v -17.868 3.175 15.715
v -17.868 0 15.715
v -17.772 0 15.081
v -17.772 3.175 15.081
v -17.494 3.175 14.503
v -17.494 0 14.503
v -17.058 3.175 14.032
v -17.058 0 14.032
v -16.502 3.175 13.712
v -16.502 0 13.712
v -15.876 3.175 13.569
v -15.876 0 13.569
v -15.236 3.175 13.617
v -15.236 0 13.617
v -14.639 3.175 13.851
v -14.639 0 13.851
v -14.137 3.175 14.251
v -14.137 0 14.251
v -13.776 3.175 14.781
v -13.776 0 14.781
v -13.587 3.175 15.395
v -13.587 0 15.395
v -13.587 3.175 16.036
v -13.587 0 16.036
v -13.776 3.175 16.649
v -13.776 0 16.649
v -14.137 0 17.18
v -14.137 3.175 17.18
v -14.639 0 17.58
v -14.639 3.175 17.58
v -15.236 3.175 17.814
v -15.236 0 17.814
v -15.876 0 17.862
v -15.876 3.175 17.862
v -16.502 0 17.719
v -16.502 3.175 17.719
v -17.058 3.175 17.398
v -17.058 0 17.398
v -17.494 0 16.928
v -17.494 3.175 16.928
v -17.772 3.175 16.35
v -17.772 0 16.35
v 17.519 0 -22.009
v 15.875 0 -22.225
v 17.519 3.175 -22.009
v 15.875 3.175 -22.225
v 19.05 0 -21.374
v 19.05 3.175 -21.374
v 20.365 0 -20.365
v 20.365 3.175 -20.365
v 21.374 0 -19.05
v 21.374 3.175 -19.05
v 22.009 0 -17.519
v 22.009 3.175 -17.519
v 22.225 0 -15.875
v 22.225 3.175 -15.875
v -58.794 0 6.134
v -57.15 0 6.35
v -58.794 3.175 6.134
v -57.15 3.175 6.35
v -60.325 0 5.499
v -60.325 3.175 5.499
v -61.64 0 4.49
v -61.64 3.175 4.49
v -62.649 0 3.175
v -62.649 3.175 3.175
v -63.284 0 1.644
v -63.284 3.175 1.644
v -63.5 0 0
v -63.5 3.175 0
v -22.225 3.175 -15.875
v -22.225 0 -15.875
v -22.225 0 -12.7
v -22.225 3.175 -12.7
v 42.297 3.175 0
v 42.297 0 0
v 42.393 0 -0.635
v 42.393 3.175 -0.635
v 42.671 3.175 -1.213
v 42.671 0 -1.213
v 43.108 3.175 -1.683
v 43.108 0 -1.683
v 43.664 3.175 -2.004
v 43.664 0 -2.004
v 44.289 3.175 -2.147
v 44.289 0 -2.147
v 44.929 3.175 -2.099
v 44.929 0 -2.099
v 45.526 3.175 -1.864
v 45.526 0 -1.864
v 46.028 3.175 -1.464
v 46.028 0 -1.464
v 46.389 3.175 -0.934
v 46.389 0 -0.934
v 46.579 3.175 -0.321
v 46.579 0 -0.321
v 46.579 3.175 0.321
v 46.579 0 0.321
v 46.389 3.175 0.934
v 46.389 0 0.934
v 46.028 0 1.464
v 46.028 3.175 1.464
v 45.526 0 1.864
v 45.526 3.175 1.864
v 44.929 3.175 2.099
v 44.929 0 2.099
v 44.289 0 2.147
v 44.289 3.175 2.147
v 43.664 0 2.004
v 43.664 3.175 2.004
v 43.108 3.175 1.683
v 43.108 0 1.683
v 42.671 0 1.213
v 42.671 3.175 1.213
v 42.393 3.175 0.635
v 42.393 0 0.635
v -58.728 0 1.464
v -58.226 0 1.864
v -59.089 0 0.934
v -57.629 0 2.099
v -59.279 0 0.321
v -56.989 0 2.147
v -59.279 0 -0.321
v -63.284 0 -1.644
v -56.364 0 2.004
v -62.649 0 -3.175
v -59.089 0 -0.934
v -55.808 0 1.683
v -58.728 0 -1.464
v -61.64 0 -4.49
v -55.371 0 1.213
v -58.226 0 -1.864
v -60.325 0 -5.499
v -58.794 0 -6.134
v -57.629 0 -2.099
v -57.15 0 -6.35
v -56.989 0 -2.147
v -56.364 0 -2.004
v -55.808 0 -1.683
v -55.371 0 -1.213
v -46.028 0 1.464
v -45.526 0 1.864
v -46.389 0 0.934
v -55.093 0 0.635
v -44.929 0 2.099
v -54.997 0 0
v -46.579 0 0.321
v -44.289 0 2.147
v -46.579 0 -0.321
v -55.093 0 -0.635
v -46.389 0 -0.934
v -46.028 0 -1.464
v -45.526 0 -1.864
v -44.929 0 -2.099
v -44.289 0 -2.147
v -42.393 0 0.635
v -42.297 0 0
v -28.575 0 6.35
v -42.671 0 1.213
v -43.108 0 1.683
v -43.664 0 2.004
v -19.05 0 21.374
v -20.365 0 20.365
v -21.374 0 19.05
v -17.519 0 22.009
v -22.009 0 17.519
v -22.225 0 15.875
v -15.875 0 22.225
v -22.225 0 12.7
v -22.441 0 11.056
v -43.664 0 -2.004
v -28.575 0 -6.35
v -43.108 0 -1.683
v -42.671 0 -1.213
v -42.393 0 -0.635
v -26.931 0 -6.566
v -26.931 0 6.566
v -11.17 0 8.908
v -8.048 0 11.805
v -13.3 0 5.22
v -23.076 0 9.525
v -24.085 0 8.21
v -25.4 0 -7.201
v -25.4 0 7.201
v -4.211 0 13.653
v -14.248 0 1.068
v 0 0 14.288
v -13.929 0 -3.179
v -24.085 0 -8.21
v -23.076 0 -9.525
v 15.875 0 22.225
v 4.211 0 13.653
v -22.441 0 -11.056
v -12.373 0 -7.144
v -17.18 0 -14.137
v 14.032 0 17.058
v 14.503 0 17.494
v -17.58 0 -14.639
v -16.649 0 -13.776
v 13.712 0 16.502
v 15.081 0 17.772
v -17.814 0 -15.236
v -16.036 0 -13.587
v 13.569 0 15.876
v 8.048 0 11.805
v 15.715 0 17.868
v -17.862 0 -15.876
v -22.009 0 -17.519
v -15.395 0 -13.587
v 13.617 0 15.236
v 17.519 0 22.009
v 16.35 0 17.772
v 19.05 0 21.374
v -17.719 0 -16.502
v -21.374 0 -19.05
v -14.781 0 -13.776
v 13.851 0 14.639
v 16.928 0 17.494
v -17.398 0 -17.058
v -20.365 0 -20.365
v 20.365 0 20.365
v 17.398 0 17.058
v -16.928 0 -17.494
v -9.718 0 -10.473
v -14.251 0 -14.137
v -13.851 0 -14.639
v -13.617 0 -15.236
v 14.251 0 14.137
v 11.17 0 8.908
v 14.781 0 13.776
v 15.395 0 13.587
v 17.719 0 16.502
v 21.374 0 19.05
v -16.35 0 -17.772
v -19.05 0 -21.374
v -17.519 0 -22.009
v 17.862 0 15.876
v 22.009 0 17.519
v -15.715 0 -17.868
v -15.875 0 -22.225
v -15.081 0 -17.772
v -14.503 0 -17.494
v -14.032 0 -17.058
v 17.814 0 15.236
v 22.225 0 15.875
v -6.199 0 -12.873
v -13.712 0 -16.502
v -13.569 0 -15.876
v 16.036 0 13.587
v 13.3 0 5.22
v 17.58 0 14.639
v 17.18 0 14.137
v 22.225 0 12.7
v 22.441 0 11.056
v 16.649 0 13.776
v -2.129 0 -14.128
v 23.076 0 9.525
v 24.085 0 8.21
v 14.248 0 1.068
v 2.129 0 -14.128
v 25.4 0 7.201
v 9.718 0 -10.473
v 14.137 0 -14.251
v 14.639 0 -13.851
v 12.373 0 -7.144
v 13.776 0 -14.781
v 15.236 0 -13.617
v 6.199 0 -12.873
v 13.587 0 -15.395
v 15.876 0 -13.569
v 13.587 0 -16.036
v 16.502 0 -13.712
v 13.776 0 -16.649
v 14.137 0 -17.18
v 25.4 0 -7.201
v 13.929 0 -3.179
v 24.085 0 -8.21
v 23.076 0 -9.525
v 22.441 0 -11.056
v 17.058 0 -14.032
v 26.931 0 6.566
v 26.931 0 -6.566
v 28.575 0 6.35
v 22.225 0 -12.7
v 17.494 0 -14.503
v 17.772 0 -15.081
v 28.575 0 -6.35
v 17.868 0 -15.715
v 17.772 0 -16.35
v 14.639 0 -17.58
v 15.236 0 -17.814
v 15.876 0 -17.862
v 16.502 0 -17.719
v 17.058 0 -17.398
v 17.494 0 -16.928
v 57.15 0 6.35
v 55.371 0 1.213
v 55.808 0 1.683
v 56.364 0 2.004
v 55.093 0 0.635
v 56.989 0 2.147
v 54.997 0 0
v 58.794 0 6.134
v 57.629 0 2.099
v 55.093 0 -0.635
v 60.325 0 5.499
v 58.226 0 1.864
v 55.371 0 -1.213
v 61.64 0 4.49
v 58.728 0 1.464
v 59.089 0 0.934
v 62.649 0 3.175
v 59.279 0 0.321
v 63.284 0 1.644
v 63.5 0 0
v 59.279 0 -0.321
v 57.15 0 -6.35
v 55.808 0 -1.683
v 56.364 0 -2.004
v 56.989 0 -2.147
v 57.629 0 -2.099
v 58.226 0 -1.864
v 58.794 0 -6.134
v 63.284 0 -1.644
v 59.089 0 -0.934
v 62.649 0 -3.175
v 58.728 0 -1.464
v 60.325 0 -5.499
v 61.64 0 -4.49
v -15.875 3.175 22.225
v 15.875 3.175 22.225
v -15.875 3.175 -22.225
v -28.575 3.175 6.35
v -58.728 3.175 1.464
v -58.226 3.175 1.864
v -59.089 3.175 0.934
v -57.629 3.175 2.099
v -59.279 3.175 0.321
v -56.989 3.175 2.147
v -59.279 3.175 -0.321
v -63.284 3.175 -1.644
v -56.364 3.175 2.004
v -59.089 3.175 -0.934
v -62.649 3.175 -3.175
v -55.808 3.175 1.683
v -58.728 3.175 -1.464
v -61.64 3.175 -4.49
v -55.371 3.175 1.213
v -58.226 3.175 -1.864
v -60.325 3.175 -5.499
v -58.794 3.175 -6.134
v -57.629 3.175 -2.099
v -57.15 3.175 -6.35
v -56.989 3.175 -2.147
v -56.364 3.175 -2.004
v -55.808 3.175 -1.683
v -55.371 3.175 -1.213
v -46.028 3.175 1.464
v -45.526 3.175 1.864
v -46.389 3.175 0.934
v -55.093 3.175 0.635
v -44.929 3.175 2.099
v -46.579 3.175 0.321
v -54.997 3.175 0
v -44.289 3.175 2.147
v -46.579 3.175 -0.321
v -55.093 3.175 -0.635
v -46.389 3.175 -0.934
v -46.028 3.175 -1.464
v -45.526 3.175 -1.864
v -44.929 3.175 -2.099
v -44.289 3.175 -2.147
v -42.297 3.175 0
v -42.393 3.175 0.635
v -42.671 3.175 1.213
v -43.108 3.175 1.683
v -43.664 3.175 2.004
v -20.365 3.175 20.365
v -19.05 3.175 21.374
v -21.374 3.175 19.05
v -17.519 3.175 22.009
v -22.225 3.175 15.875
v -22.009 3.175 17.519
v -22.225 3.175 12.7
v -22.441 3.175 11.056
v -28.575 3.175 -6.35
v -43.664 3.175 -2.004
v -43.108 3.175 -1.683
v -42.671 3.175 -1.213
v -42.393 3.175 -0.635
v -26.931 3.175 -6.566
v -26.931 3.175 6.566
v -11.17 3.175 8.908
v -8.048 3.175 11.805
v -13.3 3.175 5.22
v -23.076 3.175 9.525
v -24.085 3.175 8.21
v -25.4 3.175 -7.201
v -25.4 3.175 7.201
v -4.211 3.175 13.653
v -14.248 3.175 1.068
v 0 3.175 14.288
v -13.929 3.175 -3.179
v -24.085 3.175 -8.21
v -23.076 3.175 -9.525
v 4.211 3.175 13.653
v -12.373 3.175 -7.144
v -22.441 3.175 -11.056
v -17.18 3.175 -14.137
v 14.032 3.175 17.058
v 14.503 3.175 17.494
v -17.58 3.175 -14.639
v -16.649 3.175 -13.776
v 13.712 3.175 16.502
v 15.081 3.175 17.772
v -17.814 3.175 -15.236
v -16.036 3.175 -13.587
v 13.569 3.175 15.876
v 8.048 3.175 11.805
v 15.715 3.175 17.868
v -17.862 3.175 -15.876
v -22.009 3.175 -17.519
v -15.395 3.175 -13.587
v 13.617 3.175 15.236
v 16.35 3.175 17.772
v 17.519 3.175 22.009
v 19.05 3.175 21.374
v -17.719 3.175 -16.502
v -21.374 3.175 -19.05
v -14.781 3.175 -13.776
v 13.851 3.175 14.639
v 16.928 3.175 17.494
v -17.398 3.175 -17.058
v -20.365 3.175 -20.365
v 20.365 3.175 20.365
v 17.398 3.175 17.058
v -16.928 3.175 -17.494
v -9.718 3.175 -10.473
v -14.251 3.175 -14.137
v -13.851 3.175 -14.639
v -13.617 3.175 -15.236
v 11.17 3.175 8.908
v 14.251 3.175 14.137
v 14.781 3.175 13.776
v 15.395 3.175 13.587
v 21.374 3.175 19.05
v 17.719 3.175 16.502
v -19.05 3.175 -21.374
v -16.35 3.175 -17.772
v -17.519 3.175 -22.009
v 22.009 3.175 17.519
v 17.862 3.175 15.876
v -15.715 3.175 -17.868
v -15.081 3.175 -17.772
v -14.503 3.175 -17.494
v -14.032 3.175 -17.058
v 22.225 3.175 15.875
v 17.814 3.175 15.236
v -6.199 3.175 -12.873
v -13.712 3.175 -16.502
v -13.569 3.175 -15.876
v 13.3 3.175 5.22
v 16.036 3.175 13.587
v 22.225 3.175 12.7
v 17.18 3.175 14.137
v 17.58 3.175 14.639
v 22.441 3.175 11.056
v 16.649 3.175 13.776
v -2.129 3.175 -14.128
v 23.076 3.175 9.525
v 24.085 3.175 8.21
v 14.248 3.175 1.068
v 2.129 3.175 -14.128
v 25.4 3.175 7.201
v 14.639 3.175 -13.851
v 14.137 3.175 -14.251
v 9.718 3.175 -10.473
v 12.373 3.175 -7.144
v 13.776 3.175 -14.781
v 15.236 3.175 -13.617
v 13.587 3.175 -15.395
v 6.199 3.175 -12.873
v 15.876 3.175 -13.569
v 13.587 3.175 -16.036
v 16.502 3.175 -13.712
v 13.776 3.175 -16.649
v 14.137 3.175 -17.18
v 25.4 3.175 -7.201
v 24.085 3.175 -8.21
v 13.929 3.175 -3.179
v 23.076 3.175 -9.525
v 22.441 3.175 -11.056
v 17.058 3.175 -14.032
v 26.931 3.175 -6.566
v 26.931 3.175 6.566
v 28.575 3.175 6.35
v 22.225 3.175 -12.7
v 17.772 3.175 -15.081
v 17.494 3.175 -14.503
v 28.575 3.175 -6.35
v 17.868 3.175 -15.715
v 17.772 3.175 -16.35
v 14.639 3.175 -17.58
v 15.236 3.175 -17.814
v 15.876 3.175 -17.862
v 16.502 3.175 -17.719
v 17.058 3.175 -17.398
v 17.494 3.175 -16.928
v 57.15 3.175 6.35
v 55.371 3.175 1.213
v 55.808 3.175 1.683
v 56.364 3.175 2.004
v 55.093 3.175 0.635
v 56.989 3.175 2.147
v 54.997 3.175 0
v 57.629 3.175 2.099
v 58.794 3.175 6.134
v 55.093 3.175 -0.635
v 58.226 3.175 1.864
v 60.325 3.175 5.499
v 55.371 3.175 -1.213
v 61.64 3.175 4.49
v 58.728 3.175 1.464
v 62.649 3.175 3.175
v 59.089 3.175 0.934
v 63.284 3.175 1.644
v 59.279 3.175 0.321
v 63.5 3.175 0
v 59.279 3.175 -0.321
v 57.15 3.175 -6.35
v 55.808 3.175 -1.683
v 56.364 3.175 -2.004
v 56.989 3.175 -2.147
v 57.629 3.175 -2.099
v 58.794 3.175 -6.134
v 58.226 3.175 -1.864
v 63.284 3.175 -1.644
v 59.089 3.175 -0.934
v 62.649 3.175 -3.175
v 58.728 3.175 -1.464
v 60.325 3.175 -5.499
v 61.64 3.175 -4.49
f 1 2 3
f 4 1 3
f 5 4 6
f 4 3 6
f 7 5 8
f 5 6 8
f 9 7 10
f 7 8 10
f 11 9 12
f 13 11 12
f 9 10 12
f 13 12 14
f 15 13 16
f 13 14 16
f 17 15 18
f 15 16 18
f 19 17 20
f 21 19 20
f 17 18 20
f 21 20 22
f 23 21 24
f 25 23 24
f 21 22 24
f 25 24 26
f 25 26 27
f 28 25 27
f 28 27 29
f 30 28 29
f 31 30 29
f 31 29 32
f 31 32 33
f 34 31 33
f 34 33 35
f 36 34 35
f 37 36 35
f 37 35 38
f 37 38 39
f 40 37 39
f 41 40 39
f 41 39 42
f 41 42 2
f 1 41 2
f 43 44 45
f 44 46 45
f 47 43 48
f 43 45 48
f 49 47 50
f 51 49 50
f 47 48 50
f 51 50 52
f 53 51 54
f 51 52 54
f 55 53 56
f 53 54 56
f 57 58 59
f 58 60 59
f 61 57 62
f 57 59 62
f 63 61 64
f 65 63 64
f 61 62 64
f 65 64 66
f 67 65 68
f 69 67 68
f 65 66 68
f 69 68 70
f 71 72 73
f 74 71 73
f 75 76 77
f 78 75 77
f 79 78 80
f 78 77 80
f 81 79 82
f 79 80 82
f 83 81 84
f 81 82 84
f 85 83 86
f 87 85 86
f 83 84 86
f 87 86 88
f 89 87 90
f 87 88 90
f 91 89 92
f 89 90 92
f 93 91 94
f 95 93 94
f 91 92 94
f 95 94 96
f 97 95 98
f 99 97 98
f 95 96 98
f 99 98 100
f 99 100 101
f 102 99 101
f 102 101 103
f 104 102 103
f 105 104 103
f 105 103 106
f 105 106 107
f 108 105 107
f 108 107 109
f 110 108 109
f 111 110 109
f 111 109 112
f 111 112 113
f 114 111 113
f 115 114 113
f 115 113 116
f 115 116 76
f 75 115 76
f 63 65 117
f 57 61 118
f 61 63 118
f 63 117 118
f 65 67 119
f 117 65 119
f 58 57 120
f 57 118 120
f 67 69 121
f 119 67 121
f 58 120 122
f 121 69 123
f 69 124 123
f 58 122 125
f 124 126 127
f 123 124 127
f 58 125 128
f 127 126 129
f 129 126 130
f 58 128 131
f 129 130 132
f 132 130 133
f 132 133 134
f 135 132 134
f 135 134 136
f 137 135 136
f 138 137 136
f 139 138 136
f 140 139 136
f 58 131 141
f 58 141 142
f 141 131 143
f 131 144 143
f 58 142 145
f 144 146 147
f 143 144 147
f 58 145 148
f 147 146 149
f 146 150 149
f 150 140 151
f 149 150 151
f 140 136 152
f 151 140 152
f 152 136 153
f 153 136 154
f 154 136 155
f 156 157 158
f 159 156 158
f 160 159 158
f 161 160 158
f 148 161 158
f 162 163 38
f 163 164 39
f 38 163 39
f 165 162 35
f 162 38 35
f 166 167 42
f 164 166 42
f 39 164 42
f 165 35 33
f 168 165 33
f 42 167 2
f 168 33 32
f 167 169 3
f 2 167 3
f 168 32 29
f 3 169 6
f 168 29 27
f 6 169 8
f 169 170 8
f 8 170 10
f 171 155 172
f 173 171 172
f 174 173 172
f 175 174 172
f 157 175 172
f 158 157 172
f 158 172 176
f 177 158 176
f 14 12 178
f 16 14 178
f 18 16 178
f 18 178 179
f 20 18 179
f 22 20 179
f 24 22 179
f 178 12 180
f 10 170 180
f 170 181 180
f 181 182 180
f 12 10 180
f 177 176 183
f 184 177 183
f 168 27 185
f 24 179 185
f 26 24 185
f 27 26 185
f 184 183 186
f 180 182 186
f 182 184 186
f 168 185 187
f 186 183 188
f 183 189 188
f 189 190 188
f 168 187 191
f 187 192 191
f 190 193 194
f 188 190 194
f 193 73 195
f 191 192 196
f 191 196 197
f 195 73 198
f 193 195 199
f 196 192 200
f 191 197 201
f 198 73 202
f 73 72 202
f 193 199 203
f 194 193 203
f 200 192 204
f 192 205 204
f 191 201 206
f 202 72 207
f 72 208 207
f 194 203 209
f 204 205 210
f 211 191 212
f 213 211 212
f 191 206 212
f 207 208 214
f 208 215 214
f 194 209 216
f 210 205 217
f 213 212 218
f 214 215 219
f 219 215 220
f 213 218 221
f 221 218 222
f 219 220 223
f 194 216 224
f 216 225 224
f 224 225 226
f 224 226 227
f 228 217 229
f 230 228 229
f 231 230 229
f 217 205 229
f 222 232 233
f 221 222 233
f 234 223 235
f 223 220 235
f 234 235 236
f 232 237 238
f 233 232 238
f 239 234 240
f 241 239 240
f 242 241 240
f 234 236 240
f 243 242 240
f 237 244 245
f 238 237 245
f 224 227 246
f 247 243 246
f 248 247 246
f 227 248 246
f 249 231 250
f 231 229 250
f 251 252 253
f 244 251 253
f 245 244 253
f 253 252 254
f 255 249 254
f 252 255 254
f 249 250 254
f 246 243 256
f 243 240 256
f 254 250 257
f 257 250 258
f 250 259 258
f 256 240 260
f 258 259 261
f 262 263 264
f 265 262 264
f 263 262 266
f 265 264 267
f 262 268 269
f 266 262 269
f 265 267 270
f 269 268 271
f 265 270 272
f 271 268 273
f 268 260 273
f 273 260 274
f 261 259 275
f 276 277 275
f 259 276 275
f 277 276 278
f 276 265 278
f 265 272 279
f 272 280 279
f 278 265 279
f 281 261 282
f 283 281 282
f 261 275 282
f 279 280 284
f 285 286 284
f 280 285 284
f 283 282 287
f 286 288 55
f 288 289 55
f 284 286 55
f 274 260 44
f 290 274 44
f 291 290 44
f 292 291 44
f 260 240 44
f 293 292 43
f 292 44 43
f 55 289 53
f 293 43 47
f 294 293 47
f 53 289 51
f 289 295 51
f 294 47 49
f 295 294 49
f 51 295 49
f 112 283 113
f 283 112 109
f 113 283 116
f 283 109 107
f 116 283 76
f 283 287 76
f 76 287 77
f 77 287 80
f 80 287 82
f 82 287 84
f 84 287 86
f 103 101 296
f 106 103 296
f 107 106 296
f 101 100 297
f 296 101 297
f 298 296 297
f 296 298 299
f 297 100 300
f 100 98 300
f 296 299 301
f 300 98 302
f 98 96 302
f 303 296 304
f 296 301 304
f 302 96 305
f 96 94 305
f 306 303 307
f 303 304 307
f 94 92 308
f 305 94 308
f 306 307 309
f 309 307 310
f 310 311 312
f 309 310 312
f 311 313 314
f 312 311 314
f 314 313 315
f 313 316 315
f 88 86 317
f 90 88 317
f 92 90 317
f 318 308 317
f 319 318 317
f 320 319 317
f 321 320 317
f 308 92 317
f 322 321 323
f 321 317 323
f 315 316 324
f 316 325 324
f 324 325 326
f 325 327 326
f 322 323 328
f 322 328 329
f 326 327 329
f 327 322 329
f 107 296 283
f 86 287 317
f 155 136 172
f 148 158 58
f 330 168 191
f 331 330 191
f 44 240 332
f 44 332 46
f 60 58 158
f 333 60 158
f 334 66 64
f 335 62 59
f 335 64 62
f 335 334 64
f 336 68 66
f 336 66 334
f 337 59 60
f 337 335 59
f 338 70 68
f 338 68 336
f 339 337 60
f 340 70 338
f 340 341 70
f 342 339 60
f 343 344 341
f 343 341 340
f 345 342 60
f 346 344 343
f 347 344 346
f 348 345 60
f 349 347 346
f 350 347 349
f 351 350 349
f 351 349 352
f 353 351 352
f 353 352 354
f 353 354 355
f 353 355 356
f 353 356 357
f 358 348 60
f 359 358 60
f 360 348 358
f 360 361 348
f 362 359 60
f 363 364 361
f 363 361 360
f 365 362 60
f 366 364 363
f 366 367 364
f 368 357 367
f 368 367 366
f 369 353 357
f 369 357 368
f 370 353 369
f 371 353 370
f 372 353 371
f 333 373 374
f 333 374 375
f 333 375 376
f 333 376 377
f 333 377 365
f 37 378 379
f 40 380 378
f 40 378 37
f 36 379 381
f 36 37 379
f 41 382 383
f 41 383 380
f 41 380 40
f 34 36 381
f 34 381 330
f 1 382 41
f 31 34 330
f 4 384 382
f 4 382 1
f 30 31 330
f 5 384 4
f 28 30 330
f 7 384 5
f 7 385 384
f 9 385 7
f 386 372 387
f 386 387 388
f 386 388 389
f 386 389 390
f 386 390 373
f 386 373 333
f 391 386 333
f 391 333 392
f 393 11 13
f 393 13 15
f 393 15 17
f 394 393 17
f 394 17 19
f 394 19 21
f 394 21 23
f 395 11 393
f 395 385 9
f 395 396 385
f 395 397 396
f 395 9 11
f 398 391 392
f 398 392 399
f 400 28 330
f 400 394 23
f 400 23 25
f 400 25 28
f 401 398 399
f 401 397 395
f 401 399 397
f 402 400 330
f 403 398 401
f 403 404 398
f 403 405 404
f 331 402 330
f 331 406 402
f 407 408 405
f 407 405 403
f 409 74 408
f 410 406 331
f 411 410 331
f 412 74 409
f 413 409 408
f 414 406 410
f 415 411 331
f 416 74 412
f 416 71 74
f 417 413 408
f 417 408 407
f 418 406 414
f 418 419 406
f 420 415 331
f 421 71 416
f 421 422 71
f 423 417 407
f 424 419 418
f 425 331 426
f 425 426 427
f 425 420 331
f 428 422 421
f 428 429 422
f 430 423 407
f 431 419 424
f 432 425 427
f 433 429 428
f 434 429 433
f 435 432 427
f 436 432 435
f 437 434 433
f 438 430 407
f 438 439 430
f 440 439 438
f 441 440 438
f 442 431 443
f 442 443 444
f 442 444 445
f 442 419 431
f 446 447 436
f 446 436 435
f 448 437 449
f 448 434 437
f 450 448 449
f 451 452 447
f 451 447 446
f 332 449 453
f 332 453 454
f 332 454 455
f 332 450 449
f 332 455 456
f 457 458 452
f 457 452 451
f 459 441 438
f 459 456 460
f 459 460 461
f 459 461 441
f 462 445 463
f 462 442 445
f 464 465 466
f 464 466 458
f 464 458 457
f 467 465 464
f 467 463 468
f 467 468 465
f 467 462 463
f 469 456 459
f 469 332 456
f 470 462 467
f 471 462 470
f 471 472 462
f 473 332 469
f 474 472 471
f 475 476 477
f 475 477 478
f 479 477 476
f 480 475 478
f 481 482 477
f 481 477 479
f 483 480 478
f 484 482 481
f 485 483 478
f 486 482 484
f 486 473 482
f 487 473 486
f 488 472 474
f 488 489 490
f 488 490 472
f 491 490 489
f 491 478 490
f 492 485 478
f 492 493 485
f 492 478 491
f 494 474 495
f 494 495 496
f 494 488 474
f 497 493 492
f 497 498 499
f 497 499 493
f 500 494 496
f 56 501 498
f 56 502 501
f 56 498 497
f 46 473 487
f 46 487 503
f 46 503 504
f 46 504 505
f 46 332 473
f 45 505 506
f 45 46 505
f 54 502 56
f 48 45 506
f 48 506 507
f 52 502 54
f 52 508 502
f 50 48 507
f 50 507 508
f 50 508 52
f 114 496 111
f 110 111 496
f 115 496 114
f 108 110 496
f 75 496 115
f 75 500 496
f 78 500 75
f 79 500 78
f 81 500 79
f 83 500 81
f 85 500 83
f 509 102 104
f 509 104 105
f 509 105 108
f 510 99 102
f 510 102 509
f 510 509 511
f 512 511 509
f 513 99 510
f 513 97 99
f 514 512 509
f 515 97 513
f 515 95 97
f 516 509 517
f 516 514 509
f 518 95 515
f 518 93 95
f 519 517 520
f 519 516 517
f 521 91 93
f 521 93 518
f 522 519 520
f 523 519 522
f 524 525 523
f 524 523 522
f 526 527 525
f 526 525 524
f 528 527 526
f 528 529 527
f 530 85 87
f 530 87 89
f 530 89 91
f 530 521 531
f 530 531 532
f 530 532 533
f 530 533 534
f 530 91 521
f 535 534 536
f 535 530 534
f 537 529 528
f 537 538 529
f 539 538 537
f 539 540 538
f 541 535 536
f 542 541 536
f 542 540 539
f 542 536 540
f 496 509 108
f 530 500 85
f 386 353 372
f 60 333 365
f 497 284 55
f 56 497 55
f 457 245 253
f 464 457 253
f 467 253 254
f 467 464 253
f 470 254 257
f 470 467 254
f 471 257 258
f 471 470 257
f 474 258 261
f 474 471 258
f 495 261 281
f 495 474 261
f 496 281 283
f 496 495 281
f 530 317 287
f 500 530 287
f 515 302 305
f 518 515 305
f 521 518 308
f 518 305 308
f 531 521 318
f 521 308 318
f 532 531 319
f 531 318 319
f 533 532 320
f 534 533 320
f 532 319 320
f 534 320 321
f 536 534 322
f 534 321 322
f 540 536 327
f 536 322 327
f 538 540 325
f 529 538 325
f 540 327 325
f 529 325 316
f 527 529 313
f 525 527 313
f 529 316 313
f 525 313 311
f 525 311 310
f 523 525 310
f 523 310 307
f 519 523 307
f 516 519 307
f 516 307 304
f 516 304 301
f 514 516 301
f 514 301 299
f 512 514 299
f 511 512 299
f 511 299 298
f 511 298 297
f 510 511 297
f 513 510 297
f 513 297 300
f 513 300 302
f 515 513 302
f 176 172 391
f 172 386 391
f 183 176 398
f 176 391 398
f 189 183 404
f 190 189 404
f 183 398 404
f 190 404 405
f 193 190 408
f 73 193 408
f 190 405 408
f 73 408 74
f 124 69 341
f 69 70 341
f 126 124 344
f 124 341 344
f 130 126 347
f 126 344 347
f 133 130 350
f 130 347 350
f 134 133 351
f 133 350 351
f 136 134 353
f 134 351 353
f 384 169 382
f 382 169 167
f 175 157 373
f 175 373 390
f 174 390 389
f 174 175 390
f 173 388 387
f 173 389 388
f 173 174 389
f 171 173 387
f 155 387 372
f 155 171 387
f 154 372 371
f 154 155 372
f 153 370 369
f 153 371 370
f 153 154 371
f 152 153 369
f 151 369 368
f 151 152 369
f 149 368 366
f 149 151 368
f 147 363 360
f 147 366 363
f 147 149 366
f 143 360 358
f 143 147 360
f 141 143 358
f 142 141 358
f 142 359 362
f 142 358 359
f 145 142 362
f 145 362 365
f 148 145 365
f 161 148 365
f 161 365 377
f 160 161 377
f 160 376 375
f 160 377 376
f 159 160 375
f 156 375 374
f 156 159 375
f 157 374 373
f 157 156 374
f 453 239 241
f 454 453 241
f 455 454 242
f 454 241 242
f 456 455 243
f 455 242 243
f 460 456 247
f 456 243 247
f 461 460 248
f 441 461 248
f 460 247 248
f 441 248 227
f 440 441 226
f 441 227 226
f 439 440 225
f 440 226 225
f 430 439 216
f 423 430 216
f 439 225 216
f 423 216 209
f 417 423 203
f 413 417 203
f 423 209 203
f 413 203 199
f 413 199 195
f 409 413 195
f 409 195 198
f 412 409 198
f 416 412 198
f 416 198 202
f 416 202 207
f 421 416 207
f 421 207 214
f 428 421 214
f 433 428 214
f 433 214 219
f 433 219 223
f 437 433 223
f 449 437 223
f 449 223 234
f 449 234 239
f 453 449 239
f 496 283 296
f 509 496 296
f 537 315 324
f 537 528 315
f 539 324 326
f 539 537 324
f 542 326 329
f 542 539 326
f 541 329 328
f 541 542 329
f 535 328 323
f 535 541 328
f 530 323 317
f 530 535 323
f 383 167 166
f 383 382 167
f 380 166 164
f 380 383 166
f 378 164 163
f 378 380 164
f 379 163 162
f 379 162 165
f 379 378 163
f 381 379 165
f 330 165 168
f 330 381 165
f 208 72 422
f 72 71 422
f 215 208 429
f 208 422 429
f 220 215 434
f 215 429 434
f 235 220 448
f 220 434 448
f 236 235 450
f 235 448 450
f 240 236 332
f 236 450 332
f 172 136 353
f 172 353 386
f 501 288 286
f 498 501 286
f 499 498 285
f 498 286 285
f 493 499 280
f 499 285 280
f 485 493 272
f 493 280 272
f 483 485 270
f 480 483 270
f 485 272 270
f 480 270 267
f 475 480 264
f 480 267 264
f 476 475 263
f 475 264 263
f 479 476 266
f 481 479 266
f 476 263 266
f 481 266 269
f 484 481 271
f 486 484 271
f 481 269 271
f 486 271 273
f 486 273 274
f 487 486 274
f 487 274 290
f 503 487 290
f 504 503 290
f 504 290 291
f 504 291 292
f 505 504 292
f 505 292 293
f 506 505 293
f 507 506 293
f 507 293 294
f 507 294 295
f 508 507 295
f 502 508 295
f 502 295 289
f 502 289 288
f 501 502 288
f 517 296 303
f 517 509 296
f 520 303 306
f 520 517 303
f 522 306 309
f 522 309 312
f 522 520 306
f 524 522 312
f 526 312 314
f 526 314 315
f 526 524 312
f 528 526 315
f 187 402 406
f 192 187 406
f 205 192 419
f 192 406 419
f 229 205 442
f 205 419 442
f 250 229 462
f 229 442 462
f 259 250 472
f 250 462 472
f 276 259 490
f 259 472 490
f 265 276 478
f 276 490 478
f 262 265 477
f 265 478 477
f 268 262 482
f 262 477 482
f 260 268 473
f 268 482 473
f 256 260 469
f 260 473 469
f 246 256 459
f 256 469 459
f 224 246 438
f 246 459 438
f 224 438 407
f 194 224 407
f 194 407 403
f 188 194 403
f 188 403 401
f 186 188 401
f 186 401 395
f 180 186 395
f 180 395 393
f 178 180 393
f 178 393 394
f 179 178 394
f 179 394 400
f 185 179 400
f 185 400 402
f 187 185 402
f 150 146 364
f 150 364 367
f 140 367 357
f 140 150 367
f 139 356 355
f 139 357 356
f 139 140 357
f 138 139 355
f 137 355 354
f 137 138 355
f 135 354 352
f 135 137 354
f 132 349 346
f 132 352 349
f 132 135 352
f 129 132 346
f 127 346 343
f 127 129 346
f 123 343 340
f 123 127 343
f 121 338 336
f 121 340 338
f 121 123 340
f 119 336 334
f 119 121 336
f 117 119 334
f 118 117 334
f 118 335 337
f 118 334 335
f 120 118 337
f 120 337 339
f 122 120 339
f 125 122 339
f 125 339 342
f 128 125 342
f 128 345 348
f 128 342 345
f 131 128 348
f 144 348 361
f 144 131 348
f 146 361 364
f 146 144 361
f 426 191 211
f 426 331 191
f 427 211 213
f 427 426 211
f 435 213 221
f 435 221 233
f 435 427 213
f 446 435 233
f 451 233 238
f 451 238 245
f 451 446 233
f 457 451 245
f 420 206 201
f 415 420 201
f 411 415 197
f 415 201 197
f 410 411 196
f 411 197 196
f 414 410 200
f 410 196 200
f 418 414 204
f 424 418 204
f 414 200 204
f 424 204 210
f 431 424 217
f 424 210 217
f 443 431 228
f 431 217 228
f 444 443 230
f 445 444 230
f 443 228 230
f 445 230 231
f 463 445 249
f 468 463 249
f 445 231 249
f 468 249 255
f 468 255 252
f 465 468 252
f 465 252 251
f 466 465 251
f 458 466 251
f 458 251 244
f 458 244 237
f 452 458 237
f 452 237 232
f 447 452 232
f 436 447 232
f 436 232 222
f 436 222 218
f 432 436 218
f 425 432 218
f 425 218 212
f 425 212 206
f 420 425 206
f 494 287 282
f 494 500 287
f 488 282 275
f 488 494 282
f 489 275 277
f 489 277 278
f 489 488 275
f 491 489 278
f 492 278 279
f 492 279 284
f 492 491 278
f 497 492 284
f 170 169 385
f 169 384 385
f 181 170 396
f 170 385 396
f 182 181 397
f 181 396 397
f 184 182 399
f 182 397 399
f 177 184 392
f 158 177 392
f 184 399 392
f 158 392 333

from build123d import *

# Parameters (mm, degrees)
SKETCH1_W                    = 44.45
SKETCH1_H                    = 12.7
SKETCH1_H_2                  = 15.875
SKETCH1_W_2                  = 41.275
BOSS_EXTRUDE1_DEPTH          = 3.175
SKETCH3_R                    = 14.2875
CUT_EXTRUDE1_DEPTH           = 68.351920908
F_18_0_1695_DIAMETER_HOLE1_D = 4.3053
CIRPATTERN1_COUNT            = 4
FILLET1_R                    = 6.35
FILLET2_R                    = 6.35
F_18_0_1695_DIAMETER_HOLE2_D = 4.3053


with BuildPart() as part:
    # Sketch1 → Boss-Extrude1 (new body)
    with BuildSketch(Plane(origin=(0, 0, 0), x_dir=(1, 0, 0), z_dir=(0, 1, 0))):
        Rectangle(SKETCH1_W, SKETCH1_H)
        with Locations((0, -14.2875)):
            Rectangle(SKETCH1_W, SKETCH1_H_2)
        with Locations((42.8625, 0)):
            Rectangle(SKETCH1_W_2, SKETCH1_H)
        with Locations((0, 14.2875)):
            Rectangle(SKETCH1_W, SKETCH1_H_2)
        with Locations((-42.8625, 0)):
            Rectangle(SKETCH1_W_2, SKETCH1_H)
    extrude(amount=BOSS_EXTRUDE1_DEPTH)

    # Sketch3 → Cut-Extrude1 (cut, through all)
    with BuildSketch(Plane(origin=(0, 3.175, 0), x_dir=(1, 0, 0), z_dir=(0, 1, 0))):
        with Locations(Location((0, 0, 0), (0, 0, 270))):
            Circle(SKETCH3_R)
    extrude(amount=-CUT_EXTRUDE1_DEPTH, mode=Mode.SUBTRACT)

    # #18 (0.1695) Diameter Hole1 (through all)
    with Locations(Plane(origin=(0, 3.175, 0), x_dir=(1, 0, 0), z_dir=(0, 1, 0))):
        with Locations((-15.715448212, -15.715448212)):
            f_18_0_1695_diameter_hole1 = Hole(F_18_0_1695_DIAMETER_HOLE1_D / 2)

    # CirPattern1: #18 (0.1695) Diameter Hole1 ×4 about axis
    cirpattern1_axis = Axis((0, 0, 0), (0, 1, 0))
    for i in range(1, CIRPATTERN1_COUNT):
        add(f_18_0_1695_diameter_hole1.rotate(cirpattern1_axis, i * 360 / CIRPATTERN1_COUNT), mode=Mode.SUBTRACT)

    # Fillet1
    fillet1_edges = [part.edges().sort_by_distance(p)[0] for p in [
        (-22.225, 1.5875, 6.35),
        (-22.225, 1.5875, -6.35),
        (22.225, 1.5875, -6.35),
        (22.225, 1.5875, 6.35),
    ]]
    fillet(fillet1_edges, radius=FILLET1_R)

    # Fillet2
    fillet2_edges = [part.edges().sort_by_distance(p)[0] for p in [
        (-63.5, 1.5875, 6.35),
        (-63.5, 1.5875, -6.35),
        (-22.225, 1.5875, -22.225),
        (22.225, 1.5875, -22.225),
        (63.5, 1.5875, -6.35),
        (63.5, 1.5875, 6.35),
        (22.225, 1.5875, 22.225),
        (-22.225, 1.5875, 22.225),
    ]]
    fillet(fillet2_edges, radius=FILLET2_R - 0.0001)  # a hair under: the kernel refuses the full size

    # #18 (0.1695) Diameter Hole2 (through all)
    with Locations(Plane(origin=(0, 3.175, 0), x_dir=(1, 0, 0), z_dir=(0, 1, 0))):
        with Locations((44.45, 0), (57.15, 0)):
            f_18_0_1695_diameter_hole2 = Hole(F_18_0_1695_DIAMETER_HOLE2_D / 2)

    # Mirror1: #18 (0.1695) Diameter Hole2 across plane
    add(f_18_0_1695_diameter_hole2.mirror(Plane(origin=(0, 0, 0), x_dir=(0, 0, 1), z_dir=(1, 0, 0))), mode=Mode.SUBTRACT)


solid = part.part
